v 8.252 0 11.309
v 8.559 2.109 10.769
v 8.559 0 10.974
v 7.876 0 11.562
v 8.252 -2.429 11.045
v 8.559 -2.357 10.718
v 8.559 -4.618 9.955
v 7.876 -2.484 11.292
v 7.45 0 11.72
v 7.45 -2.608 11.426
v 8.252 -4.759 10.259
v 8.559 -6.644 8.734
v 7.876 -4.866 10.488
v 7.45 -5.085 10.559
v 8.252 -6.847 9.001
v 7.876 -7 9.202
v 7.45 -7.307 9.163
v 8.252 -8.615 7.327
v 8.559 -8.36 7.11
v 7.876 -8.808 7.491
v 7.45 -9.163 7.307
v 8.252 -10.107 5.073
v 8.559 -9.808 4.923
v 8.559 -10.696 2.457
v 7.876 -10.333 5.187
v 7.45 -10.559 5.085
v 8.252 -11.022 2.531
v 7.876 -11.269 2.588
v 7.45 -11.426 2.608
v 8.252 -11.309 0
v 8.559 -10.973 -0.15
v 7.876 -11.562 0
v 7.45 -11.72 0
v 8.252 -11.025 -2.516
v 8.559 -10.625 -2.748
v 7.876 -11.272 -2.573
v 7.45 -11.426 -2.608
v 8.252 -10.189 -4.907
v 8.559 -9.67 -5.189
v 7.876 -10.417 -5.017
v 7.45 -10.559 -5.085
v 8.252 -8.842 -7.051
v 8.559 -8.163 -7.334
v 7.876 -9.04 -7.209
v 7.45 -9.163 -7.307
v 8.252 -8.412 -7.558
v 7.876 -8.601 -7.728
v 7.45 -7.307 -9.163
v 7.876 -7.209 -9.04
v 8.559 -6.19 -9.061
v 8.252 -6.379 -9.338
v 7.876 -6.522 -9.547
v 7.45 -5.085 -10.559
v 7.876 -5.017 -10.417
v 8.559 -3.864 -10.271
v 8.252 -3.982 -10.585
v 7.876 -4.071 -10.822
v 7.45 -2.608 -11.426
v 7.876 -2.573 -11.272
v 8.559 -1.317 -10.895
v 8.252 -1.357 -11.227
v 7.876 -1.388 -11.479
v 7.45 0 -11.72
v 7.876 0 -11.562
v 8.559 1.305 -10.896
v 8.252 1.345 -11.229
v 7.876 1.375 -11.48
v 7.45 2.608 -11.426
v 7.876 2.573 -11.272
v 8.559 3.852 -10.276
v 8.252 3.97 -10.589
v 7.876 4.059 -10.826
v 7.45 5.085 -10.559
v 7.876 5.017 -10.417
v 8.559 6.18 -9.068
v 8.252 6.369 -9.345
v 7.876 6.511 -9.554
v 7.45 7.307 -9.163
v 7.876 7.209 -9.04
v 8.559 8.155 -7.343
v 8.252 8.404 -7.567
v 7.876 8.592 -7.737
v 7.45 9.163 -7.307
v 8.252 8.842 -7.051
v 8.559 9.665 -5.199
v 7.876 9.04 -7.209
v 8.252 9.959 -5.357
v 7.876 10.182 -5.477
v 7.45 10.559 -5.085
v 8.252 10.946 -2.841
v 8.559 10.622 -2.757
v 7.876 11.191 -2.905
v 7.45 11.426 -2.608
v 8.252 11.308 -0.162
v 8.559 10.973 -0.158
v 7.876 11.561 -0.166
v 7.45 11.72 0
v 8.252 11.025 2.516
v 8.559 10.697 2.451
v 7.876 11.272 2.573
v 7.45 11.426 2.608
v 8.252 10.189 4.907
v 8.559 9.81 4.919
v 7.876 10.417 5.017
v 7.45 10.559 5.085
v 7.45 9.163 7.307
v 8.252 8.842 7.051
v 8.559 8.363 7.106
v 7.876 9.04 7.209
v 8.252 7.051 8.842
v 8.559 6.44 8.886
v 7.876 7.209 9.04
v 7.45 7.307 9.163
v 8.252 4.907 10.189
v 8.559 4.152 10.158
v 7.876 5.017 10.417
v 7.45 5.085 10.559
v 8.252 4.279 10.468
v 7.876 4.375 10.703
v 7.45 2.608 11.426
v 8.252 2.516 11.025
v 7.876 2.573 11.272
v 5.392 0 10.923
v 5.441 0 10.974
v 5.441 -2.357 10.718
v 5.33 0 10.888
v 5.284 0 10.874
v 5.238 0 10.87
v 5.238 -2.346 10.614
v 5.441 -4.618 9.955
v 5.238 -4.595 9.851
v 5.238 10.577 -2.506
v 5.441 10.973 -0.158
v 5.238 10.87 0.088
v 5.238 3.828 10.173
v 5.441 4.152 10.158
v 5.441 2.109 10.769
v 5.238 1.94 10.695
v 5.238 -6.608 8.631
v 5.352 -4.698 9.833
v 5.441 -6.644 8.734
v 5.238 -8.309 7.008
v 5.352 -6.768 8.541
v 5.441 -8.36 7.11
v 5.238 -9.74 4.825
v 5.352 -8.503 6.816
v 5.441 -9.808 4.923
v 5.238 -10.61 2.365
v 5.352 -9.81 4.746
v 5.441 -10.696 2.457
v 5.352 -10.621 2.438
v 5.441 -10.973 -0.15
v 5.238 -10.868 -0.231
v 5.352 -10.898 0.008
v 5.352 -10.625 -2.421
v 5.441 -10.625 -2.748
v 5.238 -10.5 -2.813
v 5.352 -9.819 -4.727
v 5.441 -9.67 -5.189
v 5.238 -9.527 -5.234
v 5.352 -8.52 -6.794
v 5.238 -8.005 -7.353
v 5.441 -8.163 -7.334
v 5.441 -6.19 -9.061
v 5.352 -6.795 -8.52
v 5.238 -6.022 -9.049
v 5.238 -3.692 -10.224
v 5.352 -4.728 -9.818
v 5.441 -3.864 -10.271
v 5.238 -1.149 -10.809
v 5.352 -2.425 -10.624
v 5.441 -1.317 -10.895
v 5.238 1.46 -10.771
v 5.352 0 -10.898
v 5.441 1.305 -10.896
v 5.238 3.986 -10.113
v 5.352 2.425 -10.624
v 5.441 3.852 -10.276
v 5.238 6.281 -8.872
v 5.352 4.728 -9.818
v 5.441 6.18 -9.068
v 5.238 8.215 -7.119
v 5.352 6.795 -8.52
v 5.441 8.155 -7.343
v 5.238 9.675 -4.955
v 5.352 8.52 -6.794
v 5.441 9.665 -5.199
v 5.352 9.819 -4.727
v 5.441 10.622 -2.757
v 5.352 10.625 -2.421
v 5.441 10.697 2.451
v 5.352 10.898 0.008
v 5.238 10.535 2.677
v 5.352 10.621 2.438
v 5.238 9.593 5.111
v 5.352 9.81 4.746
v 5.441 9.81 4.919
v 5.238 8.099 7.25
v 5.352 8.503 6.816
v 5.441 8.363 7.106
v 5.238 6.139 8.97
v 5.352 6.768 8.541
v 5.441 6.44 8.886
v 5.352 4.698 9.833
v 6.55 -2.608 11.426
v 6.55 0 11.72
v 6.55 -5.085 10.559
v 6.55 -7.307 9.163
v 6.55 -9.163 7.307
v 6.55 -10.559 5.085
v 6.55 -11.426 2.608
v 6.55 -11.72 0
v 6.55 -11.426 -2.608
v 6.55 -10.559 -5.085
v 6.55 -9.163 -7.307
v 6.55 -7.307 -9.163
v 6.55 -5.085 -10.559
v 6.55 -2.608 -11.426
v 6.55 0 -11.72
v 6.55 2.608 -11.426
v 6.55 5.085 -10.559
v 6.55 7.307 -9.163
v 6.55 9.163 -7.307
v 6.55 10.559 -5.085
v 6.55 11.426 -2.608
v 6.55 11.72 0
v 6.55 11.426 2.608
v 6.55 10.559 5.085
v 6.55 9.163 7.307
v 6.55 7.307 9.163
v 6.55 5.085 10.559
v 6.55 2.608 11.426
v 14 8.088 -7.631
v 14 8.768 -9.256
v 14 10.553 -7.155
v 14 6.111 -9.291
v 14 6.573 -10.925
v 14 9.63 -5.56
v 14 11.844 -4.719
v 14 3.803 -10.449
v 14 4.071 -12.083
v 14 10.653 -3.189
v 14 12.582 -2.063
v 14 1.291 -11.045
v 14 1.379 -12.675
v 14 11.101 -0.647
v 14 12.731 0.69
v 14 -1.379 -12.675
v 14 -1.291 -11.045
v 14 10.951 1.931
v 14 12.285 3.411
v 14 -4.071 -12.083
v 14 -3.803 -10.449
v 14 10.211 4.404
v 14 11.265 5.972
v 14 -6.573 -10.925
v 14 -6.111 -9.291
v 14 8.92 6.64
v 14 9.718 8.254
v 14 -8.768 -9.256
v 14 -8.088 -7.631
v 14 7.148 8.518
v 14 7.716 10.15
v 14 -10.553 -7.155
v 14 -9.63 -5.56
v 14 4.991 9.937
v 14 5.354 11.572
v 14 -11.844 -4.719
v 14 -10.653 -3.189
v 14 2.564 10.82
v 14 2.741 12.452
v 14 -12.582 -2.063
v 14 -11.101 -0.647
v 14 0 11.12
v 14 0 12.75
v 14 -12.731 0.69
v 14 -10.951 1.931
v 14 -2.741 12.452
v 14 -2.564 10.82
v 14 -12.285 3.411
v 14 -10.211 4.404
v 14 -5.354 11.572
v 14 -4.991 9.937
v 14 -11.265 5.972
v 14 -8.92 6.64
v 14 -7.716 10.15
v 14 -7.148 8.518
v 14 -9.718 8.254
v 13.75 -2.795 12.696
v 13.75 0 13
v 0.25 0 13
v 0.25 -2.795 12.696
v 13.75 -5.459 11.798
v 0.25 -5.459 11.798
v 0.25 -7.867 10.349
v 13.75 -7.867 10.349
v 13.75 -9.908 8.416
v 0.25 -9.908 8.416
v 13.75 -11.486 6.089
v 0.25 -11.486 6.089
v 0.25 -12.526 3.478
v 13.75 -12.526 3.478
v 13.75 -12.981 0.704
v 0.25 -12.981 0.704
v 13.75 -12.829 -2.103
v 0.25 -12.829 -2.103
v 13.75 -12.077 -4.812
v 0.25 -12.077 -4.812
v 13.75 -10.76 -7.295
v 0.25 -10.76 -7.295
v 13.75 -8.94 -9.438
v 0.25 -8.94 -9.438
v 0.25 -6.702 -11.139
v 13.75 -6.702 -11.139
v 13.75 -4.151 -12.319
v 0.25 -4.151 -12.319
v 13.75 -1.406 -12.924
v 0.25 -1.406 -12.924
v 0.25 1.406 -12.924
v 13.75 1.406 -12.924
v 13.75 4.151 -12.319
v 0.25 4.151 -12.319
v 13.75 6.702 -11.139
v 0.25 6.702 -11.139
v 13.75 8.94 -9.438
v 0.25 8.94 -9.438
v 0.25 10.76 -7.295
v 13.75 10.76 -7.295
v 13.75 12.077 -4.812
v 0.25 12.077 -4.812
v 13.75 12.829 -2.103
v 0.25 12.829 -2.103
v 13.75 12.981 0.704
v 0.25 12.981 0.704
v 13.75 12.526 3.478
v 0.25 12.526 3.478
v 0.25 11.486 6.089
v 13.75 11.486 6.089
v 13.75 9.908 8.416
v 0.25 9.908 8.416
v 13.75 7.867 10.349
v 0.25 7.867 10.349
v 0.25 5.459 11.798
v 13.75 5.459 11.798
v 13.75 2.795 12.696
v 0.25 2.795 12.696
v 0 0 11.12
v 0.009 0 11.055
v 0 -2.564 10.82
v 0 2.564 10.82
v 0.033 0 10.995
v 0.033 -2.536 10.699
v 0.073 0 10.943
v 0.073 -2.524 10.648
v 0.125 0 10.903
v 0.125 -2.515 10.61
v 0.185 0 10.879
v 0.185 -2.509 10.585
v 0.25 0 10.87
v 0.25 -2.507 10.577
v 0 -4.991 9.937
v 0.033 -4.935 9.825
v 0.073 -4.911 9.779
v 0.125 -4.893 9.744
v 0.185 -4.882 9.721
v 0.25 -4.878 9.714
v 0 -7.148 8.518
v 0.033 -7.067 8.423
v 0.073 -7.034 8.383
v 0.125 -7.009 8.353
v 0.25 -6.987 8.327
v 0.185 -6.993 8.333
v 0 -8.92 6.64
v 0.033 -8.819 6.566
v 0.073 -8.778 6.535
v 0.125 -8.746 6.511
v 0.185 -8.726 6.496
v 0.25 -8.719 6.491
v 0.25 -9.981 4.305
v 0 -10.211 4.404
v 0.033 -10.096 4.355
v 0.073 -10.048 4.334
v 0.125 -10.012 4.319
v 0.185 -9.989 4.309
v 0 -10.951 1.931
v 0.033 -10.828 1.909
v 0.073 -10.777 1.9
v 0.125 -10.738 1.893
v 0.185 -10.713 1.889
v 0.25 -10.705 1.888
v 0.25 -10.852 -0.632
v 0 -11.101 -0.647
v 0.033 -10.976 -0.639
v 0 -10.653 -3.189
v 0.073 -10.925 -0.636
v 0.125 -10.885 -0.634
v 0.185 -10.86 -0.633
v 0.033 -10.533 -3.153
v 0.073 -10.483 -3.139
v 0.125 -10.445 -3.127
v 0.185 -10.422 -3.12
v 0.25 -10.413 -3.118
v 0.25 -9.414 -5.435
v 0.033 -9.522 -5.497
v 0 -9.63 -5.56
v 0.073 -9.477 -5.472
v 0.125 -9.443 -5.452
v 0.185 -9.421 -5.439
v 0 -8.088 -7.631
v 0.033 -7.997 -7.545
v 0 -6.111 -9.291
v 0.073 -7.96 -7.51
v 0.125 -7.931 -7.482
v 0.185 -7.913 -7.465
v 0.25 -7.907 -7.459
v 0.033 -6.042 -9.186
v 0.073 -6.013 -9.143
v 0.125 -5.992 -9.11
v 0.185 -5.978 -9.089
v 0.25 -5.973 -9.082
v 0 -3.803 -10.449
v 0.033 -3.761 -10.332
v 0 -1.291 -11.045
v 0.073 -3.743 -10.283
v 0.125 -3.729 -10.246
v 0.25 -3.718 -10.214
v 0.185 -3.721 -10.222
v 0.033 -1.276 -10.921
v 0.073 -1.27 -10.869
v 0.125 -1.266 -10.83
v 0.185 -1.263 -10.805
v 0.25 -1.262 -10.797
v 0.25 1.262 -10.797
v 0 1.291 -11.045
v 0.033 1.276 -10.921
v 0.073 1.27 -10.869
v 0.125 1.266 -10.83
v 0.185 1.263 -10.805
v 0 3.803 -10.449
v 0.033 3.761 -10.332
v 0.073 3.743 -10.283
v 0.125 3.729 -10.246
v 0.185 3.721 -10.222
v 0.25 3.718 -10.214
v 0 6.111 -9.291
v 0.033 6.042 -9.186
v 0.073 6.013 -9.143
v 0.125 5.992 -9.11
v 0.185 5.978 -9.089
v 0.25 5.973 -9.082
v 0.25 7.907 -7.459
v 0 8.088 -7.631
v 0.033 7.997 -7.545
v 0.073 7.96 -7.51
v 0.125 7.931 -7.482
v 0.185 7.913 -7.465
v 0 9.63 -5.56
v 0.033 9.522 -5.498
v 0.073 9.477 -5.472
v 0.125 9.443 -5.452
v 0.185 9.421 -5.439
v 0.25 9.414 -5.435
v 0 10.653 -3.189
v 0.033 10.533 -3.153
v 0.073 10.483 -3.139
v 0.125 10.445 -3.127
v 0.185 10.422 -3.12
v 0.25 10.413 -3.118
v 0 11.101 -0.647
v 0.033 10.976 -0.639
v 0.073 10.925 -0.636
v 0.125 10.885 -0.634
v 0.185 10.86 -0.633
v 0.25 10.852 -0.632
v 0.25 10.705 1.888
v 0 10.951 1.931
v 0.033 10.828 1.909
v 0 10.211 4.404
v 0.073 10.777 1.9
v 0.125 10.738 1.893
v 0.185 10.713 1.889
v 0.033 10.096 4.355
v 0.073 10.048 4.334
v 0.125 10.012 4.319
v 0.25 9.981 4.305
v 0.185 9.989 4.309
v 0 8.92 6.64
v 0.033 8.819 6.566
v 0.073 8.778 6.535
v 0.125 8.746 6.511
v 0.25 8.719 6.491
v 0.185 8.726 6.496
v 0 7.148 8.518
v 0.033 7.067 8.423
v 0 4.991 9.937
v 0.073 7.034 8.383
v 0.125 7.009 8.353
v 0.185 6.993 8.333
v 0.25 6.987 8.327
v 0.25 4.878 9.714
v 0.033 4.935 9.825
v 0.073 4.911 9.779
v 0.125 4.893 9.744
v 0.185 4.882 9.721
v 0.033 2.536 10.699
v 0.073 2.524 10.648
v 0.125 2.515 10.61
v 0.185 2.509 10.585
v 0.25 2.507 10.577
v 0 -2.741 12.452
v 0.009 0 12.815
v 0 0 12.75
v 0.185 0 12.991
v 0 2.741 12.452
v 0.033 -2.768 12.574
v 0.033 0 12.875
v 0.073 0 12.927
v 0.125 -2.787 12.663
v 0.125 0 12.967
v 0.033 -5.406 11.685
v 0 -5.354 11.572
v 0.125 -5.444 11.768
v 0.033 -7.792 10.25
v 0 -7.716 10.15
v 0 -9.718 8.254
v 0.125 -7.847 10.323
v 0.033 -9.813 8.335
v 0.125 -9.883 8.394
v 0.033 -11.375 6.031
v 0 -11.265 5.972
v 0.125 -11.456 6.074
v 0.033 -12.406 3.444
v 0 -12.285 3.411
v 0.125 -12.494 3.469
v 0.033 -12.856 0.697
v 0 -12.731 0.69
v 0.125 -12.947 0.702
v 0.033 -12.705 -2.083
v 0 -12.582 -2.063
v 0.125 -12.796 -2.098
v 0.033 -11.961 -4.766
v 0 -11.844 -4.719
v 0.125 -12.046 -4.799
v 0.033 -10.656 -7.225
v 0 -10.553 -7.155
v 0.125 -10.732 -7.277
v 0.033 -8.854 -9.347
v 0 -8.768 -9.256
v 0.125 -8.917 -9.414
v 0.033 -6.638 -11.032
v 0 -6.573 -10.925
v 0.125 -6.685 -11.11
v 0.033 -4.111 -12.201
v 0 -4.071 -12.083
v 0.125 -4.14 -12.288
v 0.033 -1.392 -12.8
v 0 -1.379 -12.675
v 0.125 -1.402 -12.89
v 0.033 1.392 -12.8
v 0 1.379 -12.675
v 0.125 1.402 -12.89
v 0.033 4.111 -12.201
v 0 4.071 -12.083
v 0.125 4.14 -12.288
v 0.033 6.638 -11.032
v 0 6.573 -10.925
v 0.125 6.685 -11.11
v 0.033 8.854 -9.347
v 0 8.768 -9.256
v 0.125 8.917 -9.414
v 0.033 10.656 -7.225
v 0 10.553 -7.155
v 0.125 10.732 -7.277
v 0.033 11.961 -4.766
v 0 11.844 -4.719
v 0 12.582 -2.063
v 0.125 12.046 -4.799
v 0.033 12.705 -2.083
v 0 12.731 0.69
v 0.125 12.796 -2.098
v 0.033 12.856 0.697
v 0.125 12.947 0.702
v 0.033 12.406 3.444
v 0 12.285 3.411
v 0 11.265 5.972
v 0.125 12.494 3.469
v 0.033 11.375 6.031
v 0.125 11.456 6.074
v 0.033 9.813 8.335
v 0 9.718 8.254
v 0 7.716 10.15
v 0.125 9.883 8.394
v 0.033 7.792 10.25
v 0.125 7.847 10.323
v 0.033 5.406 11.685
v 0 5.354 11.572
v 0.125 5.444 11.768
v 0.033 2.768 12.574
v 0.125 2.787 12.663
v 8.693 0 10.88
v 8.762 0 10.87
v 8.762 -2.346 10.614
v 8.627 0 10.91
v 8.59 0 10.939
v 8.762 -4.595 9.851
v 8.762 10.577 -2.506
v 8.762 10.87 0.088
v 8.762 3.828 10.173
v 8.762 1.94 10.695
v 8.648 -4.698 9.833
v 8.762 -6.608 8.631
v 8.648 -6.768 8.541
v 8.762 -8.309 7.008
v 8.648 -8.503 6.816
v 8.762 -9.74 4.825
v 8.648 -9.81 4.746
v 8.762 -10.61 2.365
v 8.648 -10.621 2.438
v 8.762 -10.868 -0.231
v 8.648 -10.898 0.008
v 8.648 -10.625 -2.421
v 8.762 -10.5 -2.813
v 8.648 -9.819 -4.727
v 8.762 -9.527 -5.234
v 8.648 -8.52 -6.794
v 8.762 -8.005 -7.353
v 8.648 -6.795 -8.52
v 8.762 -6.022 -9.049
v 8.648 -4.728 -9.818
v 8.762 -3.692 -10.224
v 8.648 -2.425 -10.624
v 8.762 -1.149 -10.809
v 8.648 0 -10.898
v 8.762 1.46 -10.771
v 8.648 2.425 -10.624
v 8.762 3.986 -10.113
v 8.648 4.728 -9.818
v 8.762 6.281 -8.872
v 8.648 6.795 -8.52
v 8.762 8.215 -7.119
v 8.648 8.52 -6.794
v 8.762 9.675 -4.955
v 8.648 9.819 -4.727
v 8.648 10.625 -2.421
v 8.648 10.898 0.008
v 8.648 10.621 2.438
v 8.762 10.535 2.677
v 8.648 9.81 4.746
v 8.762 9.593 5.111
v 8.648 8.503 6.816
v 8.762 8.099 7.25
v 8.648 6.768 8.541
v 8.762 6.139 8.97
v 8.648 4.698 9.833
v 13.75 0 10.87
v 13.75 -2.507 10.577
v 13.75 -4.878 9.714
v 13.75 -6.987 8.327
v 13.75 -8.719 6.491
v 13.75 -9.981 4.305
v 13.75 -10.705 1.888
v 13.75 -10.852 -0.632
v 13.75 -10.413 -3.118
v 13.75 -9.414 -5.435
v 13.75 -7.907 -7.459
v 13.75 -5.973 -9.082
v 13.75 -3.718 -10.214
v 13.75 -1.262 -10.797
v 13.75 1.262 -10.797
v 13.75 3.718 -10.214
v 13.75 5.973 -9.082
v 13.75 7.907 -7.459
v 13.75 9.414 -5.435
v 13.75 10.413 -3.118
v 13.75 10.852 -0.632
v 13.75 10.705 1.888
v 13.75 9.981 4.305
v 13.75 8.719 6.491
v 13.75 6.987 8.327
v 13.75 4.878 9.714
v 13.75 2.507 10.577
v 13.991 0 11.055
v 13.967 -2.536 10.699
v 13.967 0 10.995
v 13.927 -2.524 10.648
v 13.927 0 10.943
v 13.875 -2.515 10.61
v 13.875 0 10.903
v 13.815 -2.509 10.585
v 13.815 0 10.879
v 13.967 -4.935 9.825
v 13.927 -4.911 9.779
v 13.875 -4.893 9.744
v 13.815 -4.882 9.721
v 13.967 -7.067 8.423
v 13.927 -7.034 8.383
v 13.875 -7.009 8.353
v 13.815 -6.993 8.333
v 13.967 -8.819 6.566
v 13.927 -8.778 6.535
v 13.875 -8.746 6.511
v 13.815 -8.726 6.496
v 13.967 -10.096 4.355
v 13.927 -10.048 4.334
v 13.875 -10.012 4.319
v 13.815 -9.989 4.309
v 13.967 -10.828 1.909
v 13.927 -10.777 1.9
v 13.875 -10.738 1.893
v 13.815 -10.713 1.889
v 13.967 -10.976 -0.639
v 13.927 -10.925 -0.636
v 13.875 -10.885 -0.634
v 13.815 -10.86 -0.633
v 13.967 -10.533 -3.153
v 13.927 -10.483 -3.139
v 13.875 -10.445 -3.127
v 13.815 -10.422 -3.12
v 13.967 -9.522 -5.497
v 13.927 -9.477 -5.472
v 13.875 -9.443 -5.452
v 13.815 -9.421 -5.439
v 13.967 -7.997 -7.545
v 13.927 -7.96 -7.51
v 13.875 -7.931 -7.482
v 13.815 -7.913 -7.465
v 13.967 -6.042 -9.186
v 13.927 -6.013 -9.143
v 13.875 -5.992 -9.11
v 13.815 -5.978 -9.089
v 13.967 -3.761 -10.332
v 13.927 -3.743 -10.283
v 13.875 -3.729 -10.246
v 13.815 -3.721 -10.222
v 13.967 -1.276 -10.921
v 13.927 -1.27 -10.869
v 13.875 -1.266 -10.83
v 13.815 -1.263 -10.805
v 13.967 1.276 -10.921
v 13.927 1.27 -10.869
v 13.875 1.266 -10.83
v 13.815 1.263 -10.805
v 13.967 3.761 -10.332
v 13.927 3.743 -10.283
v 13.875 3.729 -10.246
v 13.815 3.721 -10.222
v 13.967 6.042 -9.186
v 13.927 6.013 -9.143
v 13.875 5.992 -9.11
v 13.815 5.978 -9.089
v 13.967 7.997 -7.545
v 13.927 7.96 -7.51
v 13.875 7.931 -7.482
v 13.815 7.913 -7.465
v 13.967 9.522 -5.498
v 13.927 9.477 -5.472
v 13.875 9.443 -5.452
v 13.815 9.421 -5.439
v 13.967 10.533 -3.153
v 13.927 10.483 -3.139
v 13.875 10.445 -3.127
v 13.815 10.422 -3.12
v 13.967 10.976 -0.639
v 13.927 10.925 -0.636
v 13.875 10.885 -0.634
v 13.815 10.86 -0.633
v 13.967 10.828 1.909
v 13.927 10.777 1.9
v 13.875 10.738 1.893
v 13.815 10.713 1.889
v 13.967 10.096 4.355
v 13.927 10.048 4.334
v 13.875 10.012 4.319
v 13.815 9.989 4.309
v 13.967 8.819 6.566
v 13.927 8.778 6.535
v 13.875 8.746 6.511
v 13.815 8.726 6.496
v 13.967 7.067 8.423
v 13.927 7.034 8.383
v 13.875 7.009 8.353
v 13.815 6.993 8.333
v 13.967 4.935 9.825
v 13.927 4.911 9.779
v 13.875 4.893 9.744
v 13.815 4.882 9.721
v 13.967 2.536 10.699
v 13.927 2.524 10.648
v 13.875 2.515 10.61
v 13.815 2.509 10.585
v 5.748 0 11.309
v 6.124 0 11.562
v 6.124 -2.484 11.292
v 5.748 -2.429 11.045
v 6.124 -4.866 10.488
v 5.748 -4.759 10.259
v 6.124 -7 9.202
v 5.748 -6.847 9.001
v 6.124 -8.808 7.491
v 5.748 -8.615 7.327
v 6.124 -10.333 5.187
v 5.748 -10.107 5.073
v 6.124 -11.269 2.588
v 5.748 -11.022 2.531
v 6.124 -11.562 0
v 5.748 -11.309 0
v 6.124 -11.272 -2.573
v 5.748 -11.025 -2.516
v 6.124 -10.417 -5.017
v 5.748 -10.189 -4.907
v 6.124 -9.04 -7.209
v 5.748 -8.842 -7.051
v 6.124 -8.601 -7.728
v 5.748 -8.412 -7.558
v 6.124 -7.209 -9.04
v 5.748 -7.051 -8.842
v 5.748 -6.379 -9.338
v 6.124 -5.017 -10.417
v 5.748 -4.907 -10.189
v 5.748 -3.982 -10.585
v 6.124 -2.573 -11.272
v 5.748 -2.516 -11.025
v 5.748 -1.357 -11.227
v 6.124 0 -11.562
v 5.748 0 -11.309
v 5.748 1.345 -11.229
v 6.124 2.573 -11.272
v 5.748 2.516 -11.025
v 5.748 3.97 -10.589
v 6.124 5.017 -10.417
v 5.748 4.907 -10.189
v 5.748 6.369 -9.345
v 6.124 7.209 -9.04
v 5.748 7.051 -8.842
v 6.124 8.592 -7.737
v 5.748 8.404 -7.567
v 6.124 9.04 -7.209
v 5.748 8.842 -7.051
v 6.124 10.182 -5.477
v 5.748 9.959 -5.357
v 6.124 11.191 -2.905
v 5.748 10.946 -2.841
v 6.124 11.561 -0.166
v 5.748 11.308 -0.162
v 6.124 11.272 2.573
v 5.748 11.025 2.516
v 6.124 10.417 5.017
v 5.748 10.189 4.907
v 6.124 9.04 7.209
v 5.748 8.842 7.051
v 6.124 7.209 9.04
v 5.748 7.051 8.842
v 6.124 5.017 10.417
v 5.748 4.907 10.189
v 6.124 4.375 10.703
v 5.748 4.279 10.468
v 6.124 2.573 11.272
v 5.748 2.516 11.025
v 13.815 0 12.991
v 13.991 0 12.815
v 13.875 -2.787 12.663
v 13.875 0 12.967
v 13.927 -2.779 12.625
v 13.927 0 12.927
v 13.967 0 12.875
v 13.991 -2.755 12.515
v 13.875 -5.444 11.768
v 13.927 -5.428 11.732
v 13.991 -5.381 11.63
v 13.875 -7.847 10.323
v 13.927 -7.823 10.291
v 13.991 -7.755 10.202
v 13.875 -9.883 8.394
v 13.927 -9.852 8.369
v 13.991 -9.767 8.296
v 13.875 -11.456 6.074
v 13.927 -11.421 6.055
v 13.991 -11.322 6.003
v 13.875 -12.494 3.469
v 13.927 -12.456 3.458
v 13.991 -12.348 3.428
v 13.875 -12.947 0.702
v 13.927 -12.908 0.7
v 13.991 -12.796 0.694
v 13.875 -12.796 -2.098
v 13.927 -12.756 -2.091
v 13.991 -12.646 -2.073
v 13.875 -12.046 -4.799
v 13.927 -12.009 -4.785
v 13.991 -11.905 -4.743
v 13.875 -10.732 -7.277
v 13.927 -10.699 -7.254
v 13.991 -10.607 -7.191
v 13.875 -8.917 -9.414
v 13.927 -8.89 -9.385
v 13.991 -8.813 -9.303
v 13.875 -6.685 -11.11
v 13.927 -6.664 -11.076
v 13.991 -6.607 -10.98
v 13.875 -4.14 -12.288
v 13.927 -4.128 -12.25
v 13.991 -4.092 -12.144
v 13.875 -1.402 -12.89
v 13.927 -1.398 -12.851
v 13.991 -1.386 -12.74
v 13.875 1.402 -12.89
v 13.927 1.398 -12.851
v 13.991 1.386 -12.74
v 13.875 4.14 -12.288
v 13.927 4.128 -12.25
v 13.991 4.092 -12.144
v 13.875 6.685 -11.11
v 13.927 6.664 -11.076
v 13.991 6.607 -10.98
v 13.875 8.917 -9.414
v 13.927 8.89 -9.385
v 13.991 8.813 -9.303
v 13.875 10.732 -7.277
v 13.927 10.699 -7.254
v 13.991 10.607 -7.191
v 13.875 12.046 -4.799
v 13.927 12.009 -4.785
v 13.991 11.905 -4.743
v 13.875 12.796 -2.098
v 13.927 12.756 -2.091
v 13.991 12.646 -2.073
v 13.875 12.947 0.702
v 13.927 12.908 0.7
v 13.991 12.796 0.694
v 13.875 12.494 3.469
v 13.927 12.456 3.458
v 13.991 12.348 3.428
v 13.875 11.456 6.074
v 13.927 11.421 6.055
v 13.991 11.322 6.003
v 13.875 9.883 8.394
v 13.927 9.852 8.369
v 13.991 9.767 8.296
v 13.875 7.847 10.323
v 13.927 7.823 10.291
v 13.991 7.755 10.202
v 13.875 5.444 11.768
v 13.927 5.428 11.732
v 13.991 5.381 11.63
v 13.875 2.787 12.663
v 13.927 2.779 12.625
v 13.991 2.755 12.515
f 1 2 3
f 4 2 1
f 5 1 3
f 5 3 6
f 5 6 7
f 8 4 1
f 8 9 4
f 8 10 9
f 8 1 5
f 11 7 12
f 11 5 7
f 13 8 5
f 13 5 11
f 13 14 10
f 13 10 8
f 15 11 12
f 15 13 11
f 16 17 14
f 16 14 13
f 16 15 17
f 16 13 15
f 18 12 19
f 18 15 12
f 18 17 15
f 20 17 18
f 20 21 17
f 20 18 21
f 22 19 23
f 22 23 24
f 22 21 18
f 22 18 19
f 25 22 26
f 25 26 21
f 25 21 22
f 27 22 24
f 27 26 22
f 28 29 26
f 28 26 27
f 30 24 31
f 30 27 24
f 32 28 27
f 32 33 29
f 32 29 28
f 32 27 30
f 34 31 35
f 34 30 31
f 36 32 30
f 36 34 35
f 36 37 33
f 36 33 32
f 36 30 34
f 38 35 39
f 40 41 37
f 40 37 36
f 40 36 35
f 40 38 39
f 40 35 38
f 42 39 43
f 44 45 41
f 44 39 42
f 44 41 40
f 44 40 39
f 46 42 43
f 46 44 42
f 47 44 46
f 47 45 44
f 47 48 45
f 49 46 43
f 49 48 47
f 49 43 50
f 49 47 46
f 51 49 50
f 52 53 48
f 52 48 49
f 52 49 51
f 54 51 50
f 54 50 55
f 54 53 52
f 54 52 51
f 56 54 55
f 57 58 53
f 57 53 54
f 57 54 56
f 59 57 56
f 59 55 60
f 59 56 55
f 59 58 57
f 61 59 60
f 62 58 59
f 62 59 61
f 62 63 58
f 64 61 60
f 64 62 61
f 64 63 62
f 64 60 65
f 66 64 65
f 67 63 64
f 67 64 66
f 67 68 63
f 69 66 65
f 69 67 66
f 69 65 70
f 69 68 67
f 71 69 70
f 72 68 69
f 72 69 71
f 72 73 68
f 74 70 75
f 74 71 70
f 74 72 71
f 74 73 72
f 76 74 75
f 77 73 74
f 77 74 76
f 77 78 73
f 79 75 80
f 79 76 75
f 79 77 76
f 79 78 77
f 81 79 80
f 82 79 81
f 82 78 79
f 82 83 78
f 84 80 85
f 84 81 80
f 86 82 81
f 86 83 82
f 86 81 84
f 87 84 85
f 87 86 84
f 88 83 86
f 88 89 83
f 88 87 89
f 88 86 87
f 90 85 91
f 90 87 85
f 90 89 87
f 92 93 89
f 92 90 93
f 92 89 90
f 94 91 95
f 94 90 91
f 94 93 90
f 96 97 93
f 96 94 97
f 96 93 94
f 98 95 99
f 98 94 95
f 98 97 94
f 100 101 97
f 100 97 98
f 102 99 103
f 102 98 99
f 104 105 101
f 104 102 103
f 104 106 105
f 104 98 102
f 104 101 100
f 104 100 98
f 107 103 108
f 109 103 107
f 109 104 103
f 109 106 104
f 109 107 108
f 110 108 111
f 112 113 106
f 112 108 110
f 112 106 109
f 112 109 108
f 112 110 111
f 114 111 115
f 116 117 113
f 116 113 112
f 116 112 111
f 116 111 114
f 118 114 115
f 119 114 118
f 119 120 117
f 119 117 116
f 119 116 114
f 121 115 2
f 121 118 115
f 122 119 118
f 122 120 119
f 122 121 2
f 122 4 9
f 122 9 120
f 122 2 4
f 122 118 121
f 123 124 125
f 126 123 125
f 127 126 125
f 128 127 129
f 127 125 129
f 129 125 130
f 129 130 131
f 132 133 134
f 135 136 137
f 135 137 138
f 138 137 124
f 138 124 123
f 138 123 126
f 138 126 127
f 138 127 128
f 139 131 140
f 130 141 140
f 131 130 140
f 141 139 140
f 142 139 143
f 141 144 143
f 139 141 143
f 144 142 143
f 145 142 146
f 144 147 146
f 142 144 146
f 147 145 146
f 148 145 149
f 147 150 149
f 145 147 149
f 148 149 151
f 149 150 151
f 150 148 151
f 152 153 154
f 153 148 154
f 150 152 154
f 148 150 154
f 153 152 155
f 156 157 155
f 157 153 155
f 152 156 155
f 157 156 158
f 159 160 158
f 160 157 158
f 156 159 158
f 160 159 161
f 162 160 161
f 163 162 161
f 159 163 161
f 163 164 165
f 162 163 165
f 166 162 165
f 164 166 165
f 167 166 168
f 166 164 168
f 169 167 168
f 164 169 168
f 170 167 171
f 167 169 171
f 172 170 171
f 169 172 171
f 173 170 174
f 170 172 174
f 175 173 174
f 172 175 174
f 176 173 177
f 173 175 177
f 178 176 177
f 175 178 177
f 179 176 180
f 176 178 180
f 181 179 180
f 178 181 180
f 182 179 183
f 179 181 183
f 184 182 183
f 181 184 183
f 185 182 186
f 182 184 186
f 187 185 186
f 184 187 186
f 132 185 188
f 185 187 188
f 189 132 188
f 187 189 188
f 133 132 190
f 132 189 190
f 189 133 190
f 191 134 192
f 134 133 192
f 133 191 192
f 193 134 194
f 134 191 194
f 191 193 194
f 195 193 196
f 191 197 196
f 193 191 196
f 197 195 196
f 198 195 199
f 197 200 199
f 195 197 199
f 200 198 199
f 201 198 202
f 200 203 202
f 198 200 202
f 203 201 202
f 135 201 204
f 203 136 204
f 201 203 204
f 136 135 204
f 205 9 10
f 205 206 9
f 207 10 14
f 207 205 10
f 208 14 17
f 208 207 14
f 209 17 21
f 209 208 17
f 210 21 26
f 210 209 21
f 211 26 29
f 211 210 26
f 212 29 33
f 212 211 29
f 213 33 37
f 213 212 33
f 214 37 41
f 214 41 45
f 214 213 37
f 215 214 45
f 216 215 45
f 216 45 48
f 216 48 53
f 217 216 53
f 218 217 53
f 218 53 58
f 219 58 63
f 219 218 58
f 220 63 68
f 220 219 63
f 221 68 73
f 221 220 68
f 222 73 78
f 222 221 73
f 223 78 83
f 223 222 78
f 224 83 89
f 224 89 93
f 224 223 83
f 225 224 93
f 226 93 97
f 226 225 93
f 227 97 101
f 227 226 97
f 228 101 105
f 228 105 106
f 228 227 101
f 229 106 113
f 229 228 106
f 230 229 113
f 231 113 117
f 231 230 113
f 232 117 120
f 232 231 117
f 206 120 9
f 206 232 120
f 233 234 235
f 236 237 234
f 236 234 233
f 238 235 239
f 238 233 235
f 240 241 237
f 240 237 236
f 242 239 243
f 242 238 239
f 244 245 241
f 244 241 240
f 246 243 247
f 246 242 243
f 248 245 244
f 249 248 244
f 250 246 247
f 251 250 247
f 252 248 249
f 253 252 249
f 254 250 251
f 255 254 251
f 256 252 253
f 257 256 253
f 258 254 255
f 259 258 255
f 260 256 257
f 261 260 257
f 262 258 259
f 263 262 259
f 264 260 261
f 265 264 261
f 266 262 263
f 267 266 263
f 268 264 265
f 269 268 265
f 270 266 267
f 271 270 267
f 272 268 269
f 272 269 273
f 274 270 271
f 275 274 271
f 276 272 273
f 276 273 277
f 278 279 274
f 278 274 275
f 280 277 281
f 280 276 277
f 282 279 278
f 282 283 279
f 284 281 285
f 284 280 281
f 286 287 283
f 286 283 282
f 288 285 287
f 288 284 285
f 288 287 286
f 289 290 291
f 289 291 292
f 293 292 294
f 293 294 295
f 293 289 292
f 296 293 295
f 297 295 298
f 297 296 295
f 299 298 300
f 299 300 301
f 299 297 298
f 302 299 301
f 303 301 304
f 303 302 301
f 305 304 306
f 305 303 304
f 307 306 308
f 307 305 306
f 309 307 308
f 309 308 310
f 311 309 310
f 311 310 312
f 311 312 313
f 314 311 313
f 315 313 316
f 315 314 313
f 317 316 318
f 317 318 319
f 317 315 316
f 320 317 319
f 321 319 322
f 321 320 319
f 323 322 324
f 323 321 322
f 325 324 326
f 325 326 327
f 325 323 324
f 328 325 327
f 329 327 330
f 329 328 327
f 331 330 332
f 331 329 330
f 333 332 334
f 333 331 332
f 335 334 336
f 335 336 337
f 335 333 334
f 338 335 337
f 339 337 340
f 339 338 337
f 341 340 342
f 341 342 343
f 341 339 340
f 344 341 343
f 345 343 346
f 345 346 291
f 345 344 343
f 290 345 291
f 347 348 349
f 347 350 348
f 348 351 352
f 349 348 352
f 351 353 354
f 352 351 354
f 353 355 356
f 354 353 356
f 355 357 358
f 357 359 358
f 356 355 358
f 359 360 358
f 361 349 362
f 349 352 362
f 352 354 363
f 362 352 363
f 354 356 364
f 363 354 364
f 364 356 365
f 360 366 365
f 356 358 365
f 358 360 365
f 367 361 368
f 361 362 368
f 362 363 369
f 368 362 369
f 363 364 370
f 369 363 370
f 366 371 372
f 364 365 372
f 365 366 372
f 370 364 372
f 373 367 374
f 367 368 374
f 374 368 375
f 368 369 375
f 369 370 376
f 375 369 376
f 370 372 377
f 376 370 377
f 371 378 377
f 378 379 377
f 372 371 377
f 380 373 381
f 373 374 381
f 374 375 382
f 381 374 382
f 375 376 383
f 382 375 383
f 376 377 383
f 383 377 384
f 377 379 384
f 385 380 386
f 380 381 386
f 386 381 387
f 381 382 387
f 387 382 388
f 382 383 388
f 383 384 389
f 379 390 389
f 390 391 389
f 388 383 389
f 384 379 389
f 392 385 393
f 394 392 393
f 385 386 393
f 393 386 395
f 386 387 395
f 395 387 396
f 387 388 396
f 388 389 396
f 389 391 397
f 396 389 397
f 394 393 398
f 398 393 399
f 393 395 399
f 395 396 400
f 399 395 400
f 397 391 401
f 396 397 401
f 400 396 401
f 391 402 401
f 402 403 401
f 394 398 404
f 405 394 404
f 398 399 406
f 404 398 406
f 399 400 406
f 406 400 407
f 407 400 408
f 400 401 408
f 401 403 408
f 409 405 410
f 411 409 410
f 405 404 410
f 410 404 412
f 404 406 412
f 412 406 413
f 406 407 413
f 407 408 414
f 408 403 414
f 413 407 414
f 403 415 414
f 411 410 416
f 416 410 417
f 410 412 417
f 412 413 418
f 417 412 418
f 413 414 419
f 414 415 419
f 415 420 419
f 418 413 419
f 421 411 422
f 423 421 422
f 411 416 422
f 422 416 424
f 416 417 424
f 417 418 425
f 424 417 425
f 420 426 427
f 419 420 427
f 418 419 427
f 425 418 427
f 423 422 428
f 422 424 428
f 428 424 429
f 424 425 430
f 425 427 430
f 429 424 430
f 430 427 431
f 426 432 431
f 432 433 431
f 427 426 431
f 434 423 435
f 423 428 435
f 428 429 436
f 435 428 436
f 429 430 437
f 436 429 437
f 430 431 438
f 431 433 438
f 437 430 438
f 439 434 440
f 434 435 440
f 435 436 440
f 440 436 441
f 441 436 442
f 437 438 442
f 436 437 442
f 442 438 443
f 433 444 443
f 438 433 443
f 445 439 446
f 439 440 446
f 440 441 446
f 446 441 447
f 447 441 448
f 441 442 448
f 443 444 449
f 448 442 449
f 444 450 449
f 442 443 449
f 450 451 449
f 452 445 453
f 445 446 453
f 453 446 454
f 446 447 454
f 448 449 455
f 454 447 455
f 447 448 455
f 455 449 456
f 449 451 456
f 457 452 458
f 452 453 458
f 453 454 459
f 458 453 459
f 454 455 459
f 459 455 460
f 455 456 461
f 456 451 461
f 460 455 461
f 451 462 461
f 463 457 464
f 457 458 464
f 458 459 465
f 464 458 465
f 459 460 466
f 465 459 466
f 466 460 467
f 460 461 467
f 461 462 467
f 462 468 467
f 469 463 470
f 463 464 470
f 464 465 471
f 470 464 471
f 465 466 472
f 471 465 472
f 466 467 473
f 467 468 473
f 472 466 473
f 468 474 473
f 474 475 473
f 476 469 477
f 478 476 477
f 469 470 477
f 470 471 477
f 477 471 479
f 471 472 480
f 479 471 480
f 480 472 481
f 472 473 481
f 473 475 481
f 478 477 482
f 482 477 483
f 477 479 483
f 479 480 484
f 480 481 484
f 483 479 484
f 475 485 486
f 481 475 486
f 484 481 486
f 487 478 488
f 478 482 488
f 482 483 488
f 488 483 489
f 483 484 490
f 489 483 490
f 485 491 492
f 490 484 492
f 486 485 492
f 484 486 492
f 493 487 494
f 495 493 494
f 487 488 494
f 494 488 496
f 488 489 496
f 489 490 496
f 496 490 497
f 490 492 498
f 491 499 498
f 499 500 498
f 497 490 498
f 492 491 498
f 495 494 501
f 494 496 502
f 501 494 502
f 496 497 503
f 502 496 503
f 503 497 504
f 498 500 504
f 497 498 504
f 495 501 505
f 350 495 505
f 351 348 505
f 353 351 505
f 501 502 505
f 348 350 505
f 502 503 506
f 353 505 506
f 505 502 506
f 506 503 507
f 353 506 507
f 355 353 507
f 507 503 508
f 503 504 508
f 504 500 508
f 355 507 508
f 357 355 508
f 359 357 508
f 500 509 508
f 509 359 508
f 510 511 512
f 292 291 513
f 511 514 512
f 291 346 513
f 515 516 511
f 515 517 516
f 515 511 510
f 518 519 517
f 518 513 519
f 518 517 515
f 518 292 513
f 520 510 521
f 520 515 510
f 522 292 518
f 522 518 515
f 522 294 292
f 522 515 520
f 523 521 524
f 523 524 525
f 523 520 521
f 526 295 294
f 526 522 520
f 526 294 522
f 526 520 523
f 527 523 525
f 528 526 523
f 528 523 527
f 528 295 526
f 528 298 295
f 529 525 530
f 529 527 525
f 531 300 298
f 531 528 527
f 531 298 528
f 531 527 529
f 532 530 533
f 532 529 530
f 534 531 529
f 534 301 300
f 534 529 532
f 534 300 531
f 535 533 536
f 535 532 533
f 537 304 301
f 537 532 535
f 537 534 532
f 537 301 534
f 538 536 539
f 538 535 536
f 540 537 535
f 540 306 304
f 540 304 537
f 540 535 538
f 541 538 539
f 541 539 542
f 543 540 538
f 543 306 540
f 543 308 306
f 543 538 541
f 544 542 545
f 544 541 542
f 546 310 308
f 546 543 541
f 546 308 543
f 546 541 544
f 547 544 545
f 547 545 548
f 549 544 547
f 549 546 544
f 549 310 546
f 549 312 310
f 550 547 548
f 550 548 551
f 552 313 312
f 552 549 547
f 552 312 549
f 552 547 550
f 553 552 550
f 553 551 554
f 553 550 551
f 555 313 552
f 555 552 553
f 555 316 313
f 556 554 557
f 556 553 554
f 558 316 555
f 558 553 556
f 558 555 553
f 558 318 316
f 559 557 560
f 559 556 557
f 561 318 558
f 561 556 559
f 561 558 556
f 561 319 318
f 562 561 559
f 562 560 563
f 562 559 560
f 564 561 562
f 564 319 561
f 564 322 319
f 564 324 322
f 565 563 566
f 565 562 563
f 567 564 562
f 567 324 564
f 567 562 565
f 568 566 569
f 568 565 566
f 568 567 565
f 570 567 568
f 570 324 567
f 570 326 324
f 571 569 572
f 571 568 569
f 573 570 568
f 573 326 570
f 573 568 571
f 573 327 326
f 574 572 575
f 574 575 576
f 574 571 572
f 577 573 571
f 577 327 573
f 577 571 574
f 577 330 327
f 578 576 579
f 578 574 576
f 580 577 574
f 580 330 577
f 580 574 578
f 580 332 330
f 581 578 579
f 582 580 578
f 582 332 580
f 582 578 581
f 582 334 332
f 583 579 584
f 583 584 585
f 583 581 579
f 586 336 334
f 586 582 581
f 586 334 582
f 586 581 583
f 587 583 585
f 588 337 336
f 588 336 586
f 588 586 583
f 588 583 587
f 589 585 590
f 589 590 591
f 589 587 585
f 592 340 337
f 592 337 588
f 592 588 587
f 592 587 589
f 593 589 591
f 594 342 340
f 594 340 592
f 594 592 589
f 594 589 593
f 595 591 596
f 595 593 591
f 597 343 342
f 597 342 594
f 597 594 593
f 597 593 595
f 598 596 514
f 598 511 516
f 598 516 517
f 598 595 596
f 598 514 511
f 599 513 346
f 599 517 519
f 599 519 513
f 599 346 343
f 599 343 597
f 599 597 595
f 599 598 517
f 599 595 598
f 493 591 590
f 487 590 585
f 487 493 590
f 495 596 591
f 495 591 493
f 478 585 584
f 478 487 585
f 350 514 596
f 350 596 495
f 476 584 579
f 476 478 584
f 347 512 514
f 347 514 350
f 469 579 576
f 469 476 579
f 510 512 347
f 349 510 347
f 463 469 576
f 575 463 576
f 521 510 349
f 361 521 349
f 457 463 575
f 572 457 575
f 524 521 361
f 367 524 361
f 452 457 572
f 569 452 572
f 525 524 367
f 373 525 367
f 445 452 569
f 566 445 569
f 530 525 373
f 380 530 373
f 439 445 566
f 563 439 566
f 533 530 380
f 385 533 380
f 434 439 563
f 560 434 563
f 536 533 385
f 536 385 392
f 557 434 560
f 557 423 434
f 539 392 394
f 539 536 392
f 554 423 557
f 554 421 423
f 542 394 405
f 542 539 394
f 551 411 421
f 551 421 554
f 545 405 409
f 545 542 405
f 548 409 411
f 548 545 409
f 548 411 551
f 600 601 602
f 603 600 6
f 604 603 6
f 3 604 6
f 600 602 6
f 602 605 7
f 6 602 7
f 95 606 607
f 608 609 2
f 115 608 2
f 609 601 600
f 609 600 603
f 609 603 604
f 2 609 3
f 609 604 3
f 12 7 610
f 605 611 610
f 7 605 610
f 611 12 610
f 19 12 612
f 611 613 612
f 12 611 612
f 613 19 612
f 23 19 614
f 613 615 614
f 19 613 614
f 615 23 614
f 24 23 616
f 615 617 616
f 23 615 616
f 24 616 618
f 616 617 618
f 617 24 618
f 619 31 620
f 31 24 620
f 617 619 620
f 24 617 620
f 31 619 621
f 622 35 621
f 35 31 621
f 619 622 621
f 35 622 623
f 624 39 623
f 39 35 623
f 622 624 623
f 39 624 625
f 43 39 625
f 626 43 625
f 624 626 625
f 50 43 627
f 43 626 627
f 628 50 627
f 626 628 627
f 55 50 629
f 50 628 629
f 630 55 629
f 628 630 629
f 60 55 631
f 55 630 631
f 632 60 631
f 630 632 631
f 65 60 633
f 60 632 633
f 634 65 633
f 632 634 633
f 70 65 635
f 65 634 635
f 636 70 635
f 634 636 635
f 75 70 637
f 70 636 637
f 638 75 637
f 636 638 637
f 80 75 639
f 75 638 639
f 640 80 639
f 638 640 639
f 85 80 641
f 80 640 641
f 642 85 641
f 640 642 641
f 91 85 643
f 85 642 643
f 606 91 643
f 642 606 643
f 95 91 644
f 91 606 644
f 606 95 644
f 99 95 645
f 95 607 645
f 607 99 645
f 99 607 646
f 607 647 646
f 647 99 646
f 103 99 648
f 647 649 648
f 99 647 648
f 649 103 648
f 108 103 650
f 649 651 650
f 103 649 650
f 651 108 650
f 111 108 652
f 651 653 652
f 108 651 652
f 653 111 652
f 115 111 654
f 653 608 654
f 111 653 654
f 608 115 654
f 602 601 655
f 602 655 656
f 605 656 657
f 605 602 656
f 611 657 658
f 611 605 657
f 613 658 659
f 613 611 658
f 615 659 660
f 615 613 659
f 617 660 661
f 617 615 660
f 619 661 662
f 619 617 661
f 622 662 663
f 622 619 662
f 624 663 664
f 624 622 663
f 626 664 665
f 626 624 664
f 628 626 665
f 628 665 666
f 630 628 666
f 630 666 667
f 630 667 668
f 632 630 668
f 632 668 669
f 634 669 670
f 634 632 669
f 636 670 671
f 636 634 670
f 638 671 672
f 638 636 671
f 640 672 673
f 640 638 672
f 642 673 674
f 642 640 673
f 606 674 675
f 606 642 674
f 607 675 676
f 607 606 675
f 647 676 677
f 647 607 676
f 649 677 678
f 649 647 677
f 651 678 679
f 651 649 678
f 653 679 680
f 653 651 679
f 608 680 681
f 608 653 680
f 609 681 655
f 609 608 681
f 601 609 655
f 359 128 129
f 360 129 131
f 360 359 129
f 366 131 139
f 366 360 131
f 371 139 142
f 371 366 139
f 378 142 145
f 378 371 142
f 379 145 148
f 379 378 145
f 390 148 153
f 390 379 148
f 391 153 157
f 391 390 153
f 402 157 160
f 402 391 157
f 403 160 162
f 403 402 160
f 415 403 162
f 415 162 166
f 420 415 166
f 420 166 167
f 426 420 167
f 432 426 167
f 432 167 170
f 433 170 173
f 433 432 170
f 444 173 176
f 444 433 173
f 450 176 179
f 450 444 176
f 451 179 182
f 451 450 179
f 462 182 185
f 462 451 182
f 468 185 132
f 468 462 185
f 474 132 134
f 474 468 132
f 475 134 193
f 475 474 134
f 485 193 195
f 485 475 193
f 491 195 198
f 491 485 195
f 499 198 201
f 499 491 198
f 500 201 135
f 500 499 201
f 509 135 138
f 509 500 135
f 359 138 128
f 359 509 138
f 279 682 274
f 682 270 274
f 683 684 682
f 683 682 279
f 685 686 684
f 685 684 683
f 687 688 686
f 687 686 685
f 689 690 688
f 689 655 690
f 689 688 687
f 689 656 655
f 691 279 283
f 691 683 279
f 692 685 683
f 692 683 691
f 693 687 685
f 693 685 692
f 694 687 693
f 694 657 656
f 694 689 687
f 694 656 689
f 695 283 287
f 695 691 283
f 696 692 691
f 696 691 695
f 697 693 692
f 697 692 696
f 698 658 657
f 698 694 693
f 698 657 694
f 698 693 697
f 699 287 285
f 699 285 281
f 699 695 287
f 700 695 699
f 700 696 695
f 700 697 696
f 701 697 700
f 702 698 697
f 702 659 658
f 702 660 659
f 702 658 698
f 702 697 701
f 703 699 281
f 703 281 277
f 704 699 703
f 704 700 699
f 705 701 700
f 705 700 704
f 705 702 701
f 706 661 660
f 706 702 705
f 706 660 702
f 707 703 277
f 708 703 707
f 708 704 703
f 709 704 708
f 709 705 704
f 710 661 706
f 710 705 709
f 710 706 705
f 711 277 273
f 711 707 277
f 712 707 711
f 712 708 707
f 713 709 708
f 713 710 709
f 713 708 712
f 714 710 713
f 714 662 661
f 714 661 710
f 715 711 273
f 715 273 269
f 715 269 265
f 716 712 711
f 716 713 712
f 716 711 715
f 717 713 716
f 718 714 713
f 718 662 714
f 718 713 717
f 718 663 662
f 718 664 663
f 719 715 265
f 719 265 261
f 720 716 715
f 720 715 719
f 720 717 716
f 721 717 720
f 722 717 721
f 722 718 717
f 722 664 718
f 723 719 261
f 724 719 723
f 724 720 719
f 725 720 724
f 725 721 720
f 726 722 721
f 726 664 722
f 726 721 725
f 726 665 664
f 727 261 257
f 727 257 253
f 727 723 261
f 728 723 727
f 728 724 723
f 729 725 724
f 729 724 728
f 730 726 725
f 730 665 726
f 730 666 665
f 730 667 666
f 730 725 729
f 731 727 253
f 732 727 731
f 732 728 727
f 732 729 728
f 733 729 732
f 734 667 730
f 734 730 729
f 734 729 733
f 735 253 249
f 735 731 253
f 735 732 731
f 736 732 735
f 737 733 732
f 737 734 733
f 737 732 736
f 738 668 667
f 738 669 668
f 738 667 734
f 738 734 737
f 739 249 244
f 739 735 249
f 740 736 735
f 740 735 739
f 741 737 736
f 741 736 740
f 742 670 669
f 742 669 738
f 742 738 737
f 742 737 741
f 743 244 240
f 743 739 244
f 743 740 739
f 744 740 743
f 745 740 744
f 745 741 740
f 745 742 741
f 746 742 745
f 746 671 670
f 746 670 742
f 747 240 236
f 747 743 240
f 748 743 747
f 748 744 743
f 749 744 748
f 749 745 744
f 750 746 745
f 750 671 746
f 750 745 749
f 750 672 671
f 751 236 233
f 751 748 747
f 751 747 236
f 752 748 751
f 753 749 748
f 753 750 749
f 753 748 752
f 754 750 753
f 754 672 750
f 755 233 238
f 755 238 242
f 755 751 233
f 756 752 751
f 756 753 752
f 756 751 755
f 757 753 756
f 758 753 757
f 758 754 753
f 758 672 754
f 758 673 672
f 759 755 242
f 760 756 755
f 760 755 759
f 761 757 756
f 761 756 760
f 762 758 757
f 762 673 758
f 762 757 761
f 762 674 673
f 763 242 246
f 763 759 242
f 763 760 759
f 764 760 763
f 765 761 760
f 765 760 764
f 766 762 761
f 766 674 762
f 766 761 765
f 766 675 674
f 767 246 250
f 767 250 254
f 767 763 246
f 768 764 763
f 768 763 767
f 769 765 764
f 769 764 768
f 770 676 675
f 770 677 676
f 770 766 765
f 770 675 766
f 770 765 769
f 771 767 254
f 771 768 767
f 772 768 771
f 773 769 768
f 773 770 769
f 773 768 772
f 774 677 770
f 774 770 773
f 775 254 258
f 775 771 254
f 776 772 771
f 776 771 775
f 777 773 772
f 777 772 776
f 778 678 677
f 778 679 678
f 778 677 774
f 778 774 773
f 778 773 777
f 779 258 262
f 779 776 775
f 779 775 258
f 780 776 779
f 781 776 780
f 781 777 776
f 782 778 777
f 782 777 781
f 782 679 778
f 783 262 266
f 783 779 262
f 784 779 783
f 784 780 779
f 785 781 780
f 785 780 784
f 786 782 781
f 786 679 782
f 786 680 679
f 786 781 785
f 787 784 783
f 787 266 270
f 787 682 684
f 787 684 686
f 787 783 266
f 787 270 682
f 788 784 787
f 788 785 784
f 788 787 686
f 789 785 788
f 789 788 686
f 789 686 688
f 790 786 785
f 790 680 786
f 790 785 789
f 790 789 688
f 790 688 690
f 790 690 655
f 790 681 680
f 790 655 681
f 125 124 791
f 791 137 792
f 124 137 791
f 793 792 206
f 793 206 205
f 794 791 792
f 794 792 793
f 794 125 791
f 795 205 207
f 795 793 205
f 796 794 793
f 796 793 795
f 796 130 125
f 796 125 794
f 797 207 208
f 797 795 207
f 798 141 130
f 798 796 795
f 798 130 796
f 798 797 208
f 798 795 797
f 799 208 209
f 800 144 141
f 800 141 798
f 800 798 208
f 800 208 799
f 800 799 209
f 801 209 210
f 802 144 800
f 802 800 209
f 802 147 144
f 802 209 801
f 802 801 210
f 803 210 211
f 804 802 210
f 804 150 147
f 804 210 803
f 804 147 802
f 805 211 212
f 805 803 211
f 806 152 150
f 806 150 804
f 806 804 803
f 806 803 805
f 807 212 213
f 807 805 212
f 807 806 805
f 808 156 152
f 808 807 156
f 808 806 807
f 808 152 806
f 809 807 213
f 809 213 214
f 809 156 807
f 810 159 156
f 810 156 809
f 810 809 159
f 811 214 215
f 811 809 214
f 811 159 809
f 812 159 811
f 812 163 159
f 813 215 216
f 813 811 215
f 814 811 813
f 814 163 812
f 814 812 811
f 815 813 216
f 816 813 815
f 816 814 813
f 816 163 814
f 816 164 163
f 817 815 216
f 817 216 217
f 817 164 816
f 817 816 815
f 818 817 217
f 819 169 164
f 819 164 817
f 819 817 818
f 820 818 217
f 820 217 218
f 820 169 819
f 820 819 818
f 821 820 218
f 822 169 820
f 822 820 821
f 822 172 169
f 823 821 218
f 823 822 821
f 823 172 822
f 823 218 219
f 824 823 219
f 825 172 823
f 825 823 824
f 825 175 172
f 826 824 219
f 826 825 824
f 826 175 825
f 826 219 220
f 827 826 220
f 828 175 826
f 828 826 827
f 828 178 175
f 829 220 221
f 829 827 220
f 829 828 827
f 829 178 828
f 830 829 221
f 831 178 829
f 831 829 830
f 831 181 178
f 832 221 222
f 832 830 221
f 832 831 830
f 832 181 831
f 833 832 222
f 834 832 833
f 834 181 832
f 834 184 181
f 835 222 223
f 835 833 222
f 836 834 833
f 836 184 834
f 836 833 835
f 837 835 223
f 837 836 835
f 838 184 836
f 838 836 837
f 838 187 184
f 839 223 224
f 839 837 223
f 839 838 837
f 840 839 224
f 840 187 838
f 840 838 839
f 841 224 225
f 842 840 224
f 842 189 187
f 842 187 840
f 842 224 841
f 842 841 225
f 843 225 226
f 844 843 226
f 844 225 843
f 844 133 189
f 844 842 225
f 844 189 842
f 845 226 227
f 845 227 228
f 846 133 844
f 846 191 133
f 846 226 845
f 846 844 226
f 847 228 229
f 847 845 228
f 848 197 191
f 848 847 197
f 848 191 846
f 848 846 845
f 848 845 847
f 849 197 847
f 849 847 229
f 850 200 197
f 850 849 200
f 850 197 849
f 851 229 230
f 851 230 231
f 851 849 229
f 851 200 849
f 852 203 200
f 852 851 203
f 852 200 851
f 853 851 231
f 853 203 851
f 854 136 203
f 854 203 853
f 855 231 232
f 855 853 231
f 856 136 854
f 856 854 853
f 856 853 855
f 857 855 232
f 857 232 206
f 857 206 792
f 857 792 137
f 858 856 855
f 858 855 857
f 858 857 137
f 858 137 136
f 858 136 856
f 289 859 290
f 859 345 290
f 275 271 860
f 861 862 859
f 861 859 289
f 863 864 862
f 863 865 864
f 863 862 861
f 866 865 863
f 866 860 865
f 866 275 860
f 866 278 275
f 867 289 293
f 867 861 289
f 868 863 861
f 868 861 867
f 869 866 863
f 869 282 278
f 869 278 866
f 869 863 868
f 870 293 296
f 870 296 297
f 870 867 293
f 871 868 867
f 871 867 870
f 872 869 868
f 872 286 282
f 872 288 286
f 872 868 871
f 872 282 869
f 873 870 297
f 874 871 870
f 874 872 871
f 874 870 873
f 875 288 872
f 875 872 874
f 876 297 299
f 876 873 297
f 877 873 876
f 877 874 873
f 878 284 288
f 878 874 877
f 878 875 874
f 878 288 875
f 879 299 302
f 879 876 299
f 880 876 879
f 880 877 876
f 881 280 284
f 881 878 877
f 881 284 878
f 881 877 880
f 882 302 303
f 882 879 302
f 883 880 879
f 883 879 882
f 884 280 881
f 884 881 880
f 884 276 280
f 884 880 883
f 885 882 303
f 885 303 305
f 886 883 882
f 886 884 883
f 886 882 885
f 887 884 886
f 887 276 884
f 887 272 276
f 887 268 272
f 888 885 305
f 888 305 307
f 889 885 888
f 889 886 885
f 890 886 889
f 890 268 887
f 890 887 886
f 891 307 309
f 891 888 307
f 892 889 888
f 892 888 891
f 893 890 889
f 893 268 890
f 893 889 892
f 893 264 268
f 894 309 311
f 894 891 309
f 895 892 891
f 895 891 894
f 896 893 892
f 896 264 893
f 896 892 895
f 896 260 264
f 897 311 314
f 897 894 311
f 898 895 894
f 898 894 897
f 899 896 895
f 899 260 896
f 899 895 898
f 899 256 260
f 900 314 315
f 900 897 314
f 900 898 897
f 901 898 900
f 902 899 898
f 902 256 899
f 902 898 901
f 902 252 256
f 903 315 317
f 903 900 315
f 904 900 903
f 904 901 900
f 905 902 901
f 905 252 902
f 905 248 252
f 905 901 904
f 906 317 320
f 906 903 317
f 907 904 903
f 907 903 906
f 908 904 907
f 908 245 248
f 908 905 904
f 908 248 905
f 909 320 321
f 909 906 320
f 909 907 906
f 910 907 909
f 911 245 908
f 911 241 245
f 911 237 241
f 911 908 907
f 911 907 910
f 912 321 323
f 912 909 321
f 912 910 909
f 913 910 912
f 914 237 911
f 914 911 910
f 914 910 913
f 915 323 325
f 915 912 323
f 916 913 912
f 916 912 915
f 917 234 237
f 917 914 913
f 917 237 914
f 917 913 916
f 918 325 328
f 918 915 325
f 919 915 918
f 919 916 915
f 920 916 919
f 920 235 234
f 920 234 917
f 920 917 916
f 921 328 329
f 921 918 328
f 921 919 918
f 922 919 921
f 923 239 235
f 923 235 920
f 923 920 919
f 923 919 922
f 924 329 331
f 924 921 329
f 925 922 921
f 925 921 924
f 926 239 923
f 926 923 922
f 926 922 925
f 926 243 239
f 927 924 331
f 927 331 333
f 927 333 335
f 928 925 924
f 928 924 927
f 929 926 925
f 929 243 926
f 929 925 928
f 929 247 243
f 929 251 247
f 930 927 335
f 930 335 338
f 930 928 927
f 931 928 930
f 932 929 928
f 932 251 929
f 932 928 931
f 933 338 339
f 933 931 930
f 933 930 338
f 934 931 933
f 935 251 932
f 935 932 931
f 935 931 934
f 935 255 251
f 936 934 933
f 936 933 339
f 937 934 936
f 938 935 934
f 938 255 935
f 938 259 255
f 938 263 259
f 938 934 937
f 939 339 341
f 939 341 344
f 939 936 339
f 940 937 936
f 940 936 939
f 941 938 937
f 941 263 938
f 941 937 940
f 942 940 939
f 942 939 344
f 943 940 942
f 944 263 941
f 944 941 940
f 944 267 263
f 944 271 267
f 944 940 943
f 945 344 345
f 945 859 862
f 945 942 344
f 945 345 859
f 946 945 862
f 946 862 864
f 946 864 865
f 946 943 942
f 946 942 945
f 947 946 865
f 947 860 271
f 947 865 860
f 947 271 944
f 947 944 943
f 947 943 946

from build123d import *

# Parameters (mm, degrees)
FILLET1_R = 0.25


with BuildPart() as part:
    # Sketch1 → Revolve1 (revolve)
    with BuildSketch(Plane.XY, mode=Mode.PRIVATE) as revolve1_sk:
        with BuildLine():
            Line((0, 10.87), (0, 13))
            Line((0, 13), (14, 13))
            Line((14, 13), (14, 10.87))
            Line((14, 10.87), (8.628829459, 10.87))
            ThreePointArc((8.628829459, 10.87), (8.122946116, 11.410846188), (7.45, 11.72))
            Line((7.45, 11.72), (6.55, 11.72))
            ThreePointArc((6.55, 11.72), (5.877053884, 11.410846188), (5.371170541, 10.87))
            Line((5.371170541, 10.87), (0, 10.87))
        make_face()
    revolve(revolve1_sk.sketch.rotate(Axis((0, 0, 0), (1, 0, 0)), 90), axis=Axis((0, 0, 0), (1, 0, 0)))

    # Fillet1
    fillet1_edges = [part.edges().sort_by_distance(p)[0] for p in [
        (5.371170541, 0, -10.87),
        (8.628829459, 0, -10.87),
        (14, 0, -10.87),
        (14, 0, -13),
        (0, 0, -13),
        (0, 0, -10.87),
    ]]
    fillet(fillet1_edges, radius=FILLET1_R)


solid = part.part
